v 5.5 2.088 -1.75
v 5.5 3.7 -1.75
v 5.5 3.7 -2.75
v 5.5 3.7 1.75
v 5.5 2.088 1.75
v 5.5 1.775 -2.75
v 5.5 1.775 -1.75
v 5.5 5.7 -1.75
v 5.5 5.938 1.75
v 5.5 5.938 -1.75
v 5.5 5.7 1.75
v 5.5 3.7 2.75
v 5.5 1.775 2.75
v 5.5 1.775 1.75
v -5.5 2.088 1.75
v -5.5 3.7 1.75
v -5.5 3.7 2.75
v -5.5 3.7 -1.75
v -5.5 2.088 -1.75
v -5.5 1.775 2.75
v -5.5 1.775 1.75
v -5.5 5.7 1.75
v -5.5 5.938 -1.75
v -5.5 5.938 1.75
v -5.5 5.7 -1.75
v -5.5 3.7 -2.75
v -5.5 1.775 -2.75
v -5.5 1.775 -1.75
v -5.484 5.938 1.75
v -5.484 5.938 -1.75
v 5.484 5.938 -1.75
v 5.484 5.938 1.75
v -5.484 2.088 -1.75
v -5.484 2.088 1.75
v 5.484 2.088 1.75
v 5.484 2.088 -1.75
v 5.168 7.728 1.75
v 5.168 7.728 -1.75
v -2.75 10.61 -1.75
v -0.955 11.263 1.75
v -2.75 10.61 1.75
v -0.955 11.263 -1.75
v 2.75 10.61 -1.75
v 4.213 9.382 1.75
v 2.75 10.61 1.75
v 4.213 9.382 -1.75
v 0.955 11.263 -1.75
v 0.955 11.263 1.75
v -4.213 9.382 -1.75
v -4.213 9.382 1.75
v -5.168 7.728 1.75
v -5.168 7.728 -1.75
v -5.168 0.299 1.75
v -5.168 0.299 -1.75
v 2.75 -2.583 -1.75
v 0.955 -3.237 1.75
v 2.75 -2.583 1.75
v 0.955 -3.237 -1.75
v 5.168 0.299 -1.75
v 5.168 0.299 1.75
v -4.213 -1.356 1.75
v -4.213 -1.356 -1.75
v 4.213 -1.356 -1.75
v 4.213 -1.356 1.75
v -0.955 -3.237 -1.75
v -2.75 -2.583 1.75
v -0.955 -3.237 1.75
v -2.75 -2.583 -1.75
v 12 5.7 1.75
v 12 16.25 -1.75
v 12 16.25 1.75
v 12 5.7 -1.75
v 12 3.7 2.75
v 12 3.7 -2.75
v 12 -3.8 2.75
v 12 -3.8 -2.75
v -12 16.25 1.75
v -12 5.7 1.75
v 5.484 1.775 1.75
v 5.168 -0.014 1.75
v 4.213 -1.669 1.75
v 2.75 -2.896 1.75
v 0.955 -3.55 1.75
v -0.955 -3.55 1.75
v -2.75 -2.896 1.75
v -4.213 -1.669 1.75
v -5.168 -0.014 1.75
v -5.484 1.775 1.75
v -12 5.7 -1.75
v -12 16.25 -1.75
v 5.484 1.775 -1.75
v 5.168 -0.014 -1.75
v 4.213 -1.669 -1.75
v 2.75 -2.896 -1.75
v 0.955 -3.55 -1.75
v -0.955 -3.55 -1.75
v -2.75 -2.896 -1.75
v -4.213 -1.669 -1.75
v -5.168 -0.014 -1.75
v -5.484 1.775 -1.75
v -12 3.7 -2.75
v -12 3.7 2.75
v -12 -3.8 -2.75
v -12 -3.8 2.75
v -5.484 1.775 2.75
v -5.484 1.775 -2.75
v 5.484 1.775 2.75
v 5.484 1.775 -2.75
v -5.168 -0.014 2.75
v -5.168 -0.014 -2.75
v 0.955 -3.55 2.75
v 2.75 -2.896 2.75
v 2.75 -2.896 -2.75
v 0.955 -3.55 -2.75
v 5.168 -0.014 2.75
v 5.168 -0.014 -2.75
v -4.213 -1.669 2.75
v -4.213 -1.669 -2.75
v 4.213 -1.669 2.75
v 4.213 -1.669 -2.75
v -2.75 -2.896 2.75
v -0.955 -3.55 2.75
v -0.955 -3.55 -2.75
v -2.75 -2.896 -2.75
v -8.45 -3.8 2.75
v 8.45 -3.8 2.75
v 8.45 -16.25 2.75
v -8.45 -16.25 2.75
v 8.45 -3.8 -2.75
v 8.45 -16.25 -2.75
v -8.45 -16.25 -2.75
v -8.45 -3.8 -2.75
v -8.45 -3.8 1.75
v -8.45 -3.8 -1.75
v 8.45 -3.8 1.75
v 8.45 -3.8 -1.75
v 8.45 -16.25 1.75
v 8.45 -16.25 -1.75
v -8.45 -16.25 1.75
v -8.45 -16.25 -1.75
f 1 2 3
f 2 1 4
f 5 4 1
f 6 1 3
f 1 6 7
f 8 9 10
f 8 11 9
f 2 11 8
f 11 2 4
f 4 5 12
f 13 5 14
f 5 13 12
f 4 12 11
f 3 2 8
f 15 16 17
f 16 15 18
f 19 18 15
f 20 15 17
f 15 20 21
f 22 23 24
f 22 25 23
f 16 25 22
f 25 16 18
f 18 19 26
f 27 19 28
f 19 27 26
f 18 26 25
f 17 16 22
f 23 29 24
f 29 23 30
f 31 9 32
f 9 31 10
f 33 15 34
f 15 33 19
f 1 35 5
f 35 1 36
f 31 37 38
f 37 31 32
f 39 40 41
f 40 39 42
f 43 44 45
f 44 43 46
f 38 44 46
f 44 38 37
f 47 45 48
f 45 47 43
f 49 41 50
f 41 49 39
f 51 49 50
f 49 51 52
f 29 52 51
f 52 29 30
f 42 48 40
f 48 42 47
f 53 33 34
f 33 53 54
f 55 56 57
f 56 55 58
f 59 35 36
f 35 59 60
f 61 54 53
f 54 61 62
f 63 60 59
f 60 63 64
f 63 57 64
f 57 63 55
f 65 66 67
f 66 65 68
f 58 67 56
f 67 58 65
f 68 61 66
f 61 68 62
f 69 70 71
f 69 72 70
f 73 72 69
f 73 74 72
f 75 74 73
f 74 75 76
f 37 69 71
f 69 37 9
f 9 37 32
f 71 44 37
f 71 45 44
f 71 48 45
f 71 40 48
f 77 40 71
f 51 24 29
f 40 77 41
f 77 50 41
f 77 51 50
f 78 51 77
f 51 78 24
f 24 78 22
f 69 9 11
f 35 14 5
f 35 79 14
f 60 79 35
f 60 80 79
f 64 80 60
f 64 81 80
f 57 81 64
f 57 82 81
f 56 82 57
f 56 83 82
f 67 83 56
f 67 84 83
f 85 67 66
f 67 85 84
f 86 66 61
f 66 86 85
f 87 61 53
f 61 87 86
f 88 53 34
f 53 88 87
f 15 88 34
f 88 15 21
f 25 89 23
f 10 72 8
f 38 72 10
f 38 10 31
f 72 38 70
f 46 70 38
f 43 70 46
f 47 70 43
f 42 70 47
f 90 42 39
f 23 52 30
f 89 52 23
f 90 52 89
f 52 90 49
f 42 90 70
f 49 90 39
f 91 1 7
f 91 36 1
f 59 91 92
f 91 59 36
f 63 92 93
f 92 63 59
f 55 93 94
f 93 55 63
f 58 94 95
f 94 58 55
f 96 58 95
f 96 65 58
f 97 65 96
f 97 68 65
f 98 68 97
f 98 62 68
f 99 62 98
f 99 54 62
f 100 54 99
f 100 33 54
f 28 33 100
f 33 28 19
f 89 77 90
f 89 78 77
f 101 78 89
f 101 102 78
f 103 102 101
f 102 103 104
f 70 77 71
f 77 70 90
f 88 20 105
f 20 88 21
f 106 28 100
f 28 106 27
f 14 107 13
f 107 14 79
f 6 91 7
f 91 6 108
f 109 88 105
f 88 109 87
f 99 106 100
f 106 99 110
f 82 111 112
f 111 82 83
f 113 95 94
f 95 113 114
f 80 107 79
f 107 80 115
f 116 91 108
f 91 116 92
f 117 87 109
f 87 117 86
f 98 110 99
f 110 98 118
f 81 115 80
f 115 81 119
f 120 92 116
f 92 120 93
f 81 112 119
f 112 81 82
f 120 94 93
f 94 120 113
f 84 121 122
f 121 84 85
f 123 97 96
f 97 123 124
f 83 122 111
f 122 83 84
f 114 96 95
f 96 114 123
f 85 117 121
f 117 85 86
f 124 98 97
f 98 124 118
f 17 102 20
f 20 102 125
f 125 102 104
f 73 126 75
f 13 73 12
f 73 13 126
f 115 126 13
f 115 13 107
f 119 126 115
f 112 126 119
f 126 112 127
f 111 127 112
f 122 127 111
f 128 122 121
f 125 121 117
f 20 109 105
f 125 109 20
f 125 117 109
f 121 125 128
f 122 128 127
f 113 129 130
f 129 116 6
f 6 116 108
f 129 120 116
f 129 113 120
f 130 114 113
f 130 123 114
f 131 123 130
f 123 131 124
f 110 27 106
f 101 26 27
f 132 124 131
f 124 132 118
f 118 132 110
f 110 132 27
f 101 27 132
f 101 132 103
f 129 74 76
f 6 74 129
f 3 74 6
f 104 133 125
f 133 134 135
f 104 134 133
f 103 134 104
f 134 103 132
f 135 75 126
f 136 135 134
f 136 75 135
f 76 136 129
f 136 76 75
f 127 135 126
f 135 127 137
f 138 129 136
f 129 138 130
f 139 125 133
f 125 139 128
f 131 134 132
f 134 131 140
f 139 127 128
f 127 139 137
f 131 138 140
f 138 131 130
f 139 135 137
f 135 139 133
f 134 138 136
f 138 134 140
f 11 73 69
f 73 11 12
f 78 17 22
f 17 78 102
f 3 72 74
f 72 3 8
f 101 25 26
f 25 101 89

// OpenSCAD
// file: headlightCowlInstrumentBracket.scad
/**
 * @file headlightCowlInstrumentBracket.scad
 *
 * @version 1.0
 *
 * @author Calum Judd Anderson
 *
 * @brief Fix for broken Aprilia ETX 125 instrument bracket that hangs off the headlight cowl.
 */
INTERFERENCE_FIT=0.001;
SLIDE_FIT=0.05;

module right_angle_triangle(base, height, thickness) {
    linear_extrude(height = thickness, center = true) {
        polygon(points = [[0, 0],          // The 90-degree corner at the origin
            [base, 0],       // The end of the flat base (X-axis)
            [0, height]      // The top vertex (Y-axis)
        ]);
    }
}

module originalBracketHole(bracketCubeHole, bracketHeight) {
    union() {
        cube([bracketCubeHole, 3.85, bracketHeight + SLIDE_FIT], center=true);
        translate([0, bracketCubeHole/6, 0])
            cylinder(bracketHeight + SLIDE_FIT, d=bracketCubeHole, center=true);
        translate([0, -bracketCubeHole/6, 0])
            cylinder(bracketHeight + SLIDE_FIT, d=bracketCubeHole, center=true);
    }
}

module originalSupportingBracket(triangleThickness) {
    triangleHeight = 10.00 - triangleThickness;
    triangleBase = 12.50;
    
    rotate([-90, 0, 90])
        translate([0, (triangleHeight/4) + 0.1, 0])
            right_angle_triangle(triangleBase, triangleHeight, triangleThickness);
}

module originalBracketPiece(bracketWidth, bracketHeight, bracketLength, bracketCubeHole) {
    bracketHoleDistanceFromTop = 5.00;
    bracketHoleComputeDistanceFromTop = (bracketLength/2) - (bracketCubeHole/1.52) - bracketHoleDistanceFromTop;
    
    difference() {
            cube([bracketWidth, bracketLength, bracketHeight], center=true);

            translate([0, bracketHoleComputeDistanceFromTop, 0])
                originalBracketHole(bracketCubeHole, bracketHeight);
            
            
        }
}

module instrumentBracket() {
    bracketWidth = 24.00;
    bracketHeight = 3.50;
    bracketLength = 32.50;
    
    bracketCubeHole = 11.00;
    
    union() {
        /* Left Bracket */
        translate([(bracketWidth-bracketHeight)/2, -bracketLength/2, 0])
            originalSupportingBracket(bracketHeight);

        originalBracketPiece(bracketWidth, bracketHeight, bracketLength, bracketCubeHole);
        
        /* Right Bracket */
        translate([-(bracketWidth-bracketHeight)/2, -bracketLength/2, 0])
            originalSupportingBracket(bracketHeight);
    }
}

instrumentBracket();
// main file
/**
 * @file headlightCowlInstrumentBracketRepair.scad
 *
 * @version 1.0
 *
 * @author Calum Judd Anderson
 *
 * @brief Fix for broken Aprilia ETX 125 instrument bracket that hangs off the headlight cowl.
 */
use <headlightCowlInstrumentBracket.scad>;

INTERFERENCE_FIT=0.01;
SLIDE_FIT=0.05;

module repairPart(bracketWidth, bracketHeight, bracketLength, bracketCubeHole) {

    cutOriginalPartOffset = -11.3;
    cutSquareDepth = 15;
    
    repairPartWidth = bracketWidth - (bracketHeight*2) - (SLIDE_FIT * 2);
    repairPartDepth = 12.5;
    repairPartHeight = bracketHeight + 2.00;

    rampWidth = 6.5;
    
    union() {
        difference() {
            originalBracketPiece(bracketWidth, bracketHeight, bracketLength, bracketCubeHole);
            translate([0, cutOriginalPartOffset, 0])
                cube([bracketWidth + INTERFERENCE_FIT, cutSquareDepth, bracketHeight + INTERFERENCE_FIT], center=true);
        }
        
        /* Repair Joining Piece */
        translate([0, 3.7, 0])
            difference() {
                cube([bracketWidth, cutSquareDepth, repairPartHeight], center=true);
                originalBracketHole(bracketCubeHole, repairPartHeight + INTERFERENCE_FIT);
                translate([0, cutSquareDepth/2, 0])
                    cube([bracketWidth + INTERFERENCE_FIT, cutSquareDepth, repairPartHeight + INTERFERENCE_FIT], center=true);
            }
        
        /* Repair Insert */
        translate([0, -(10), 0])
            difference() {
                cube([repairPartWidth, repairPartDepth, repairPartHeight], center=true);
                cube([repairPartWidth + INTERFERENCE_FIT, repairPartDepth + INTERFERENCE_FIT, bracketHeight], center=true);
            }

        /* Ramps */
        translate([(bracketWidth-rampWidth)/2, 3.7, bracketHeight/2])
            rotate([90, 0, 90])
                right_angle_triangle(2, 1, 6.50);
        
        translate([-(bracketWidth-rampWidth)/2, 3.7, bracketHeight/2])
            rotate([90, 0, 90])
                right_angle_triangle(2, 1, 6.50);
                
        translate([(bracketWidth-rampWidth)/2, 3.7, -bracketHeight/2])
            rotate([-90, 0, 90])
                right_angle_triangle(2, 1, 6.50);
        
        translate([-(bracketWidth-rampWidth)/2, 3.7, -bracketHeight/2])
            rotate([-90, 0, 90])
                right_angle_triangle(2, 1, 6.50);
    }
}

module brokenPart(bracketWidth, bracketHeight, bracketLength, bracketCubeHole) {
    bracketCutLength = 25.00;
    
    difference() {
        instrumentBracket();
        translate([0, 8.7, 0])
            cube([bracketWidth + INTERFERENCE_FIT, bracketCutLength, bracketHeight + INTERFERENCE_FIT], center=true);
    }
}

BRACKET_WIDTH = 24.00;
BRACKET_HEIGHT = 3.50;
BRACKET_LENGTH = 32.50;

BRACKET_CUBE_HOLE = 11.00;

color("red")
    repairPart(BRACKET_WIDTH, BRACKET_HEIGHT, BRACKET_LENGTH, BRACKET_CUBE_HOLE);

//color("yellow")
//    brokenPart(BRACKET_WIDTH, BRACKET_HEIGHT, BRACKET_LENGTH, BRACKET_CUBE_HOLE);
